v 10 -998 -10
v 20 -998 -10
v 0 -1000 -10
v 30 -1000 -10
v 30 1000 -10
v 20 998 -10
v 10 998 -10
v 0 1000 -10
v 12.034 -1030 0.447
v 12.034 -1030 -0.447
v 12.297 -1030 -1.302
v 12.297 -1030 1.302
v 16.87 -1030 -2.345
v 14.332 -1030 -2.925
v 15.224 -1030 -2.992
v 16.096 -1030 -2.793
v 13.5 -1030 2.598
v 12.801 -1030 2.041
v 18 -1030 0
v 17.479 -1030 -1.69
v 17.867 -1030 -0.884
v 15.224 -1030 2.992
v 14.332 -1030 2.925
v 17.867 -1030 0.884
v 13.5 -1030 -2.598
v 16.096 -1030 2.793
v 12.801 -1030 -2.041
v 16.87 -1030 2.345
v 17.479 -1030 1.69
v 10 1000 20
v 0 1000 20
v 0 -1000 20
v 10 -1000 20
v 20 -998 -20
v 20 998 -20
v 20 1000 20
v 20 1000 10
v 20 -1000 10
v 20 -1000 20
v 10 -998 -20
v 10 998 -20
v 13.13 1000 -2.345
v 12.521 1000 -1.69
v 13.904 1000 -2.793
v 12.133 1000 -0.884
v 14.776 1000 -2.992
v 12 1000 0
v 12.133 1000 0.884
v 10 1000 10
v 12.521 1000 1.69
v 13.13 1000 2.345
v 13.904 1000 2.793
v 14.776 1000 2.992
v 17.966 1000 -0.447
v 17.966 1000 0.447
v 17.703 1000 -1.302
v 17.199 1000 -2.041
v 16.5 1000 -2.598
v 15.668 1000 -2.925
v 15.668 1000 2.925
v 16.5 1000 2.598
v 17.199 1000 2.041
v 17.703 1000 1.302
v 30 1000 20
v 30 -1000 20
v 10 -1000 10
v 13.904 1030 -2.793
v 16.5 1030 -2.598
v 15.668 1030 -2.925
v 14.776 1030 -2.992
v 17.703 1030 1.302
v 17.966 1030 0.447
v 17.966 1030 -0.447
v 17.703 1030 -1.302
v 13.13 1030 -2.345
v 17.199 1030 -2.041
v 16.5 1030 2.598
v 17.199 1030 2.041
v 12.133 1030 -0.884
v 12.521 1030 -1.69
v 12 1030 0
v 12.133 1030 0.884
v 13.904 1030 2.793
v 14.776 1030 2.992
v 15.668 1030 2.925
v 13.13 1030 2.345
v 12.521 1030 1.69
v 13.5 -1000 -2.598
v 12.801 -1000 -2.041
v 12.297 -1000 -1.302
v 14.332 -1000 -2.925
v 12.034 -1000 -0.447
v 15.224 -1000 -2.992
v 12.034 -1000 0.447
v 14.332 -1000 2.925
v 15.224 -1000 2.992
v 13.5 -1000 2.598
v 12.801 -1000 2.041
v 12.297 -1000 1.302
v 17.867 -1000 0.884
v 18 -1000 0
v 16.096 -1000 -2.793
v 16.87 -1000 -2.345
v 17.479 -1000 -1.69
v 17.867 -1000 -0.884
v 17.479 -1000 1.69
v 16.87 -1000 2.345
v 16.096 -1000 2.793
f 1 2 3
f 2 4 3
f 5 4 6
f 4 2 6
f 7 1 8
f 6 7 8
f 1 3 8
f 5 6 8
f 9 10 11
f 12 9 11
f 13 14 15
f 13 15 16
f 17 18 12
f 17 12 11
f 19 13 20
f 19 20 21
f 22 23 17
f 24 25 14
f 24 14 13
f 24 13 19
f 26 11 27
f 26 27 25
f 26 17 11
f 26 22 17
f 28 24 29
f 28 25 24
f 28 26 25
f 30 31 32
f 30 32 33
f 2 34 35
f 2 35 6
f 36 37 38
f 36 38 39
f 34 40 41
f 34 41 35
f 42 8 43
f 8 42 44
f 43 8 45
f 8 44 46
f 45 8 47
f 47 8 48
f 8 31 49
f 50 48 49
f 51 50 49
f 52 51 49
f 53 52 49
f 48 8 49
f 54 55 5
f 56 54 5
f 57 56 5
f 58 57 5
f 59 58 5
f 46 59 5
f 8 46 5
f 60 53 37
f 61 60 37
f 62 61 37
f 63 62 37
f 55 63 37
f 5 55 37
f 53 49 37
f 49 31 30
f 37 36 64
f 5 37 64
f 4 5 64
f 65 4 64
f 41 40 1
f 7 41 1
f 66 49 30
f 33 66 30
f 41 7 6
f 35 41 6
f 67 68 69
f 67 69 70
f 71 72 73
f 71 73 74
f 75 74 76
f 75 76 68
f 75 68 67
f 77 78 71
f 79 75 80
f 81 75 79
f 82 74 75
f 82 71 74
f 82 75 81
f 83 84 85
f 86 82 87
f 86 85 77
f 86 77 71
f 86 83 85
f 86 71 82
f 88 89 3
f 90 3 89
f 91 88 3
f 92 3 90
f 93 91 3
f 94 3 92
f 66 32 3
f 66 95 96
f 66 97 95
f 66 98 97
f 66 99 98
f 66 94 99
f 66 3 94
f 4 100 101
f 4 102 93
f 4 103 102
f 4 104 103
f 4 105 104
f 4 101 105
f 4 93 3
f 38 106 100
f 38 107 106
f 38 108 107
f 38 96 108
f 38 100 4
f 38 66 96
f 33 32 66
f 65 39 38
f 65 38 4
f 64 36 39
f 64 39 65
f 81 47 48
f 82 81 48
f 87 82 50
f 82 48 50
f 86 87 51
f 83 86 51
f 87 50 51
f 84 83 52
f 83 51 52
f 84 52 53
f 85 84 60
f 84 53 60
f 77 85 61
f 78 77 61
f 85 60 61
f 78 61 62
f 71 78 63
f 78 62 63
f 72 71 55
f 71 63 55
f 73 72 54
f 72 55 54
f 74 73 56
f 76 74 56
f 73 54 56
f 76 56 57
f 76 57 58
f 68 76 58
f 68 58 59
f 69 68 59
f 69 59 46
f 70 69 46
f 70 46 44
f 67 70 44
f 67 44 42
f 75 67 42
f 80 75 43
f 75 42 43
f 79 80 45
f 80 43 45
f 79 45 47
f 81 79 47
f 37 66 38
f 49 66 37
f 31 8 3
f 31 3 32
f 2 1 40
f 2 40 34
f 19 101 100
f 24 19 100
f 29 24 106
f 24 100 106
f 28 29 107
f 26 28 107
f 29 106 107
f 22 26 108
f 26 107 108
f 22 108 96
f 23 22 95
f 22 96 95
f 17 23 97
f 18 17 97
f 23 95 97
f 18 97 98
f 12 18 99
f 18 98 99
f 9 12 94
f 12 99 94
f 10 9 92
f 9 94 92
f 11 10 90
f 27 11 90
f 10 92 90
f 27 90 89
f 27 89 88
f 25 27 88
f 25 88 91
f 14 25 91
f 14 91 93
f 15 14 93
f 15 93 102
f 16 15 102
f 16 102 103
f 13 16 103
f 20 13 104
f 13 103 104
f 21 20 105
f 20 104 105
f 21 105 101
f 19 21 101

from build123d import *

# Parameters (mm, degrees)
F0_W      = 2000
F0_H      = 20
F1_DEPTH  = 30
F2_W      = 10
F2_H      = 10
F3_DEPTH  = 2000
F4_W      = 10
F4_H      = 10
F5_DEPTH  = 2000
F7_START  = -2
F6_W      = 10
F6_H      = 10
F7_DEPTH  = 1996
F8_R      = 3
F9_DEPTH  = 30
F10_R     = 3
F11_DEPTH = 30


with BuildPart() as f1:
    # F0 (on Right) → F1 (new body)
    with BuildSketch(Plane.YZ):
        Rectangle(F0_W, F0_H)
    extrude(amount=F1_DEPTH)

    # F2 (on face) → F3 (join)
    with BuildSketch(Plane.XZ.offset(1000)):
        with Locations((5, 15)):
            Rectangle(F2_W, F2_H)
    extrude(amount=-F3_DEPTH)

    # F4 (on face) → F5 (join)
    with BuildSketch(Plane.XZ.offset(1000)):
        with Locations((25, 15)):
            Rectangle(F4_W, F4_H)
    extrude(amount=-F5_DEPTH)

    # F6 (on face) → F7 (join)
    with BuildSketch(Plane.XZ.offset(1000).offset(F7_START)):
        with Locations((15, -15)):
            Rectangle(F6_W, F6_H)
    extrude(amount=-F7_DEPTH)

    # F8 (on face) → F9 (join)
    with BuildSketch(Plane.XZ.offset(1000)):
        with Locations((15, 0)):
            Circle(F8_R)
    extrude(amount=F9_DEPTH)

    # F10 (on face) → F11 (join)
    with BuildSketch(Plane(origin=(0, 1000, 0), x_dir=(-1, 0, 0), z_dir=(0, 1, 0))):
        with Locations((-15, 0)):
            Circle(F10_R)
    extrude(amount=F11_DEPTH)


solid = f1.part
